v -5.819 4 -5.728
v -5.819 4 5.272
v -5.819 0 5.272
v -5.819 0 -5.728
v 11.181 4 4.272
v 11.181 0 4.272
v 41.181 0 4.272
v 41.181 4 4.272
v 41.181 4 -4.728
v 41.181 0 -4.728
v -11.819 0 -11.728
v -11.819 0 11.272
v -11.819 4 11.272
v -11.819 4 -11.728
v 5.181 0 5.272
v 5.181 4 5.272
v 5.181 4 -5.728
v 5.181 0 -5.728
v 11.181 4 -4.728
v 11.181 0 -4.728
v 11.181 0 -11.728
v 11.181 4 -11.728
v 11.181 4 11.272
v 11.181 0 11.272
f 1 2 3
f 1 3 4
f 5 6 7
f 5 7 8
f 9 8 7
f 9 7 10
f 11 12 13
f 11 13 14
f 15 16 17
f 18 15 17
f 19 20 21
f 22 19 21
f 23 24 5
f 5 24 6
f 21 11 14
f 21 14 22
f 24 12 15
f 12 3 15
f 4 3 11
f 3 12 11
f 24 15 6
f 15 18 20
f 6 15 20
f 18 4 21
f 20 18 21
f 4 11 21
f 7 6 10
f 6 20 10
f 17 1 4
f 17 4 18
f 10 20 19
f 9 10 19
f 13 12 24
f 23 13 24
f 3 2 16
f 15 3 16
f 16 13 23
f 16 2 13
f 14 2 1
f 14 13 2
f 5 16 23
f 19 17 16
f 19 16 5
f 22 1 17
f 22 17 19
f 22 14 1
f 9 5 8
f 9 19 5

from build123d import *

# Parameters (mm, degrees)
SKETCH1_W           = 23
SKETCH1_H           = 23
BOSS_EXTRUDE1_DEPTH = 4
SKETCH2_W           = 11
SKETCH2_H           = 11
CUT_EXTRUDE1_DEPTH  = 4
SKETCH3_W           = 9
SKETCH3_H           = 4
BOSS_EXTRUDE2_DEPTH = 30


with BuildPart() as part:
    # Sketch1 → Boss-Extrude1 (new body)
    with BuildSketch(Plane(origin=(0, 0, 0), x_dir=(1, 0, 0), z_dir=(0, 1, 0))):
        with Locations((-0.318811881, 0.227722772)):
            Rectangle(SKETCH1_W, SKETCH1_H)
    extrude(amount=BOSS_EXTRUDE1_DEPTH)

    # Sketch2 → Cut-Extrude1 (cut)
    with BuildSketch(Plane(origin=(0, 4, 0), x_dir=(1, 0, 0), z_dir=(0, 1, 0))):
        with Locations((-0.318811881, 0.227722772)):
            Rectangle(SKETCH2_W, SKETCH2_H)
    extrude(amount=-CUT_EXTRUDE1_DEPTH, mode=Mode.SUBTRACT)

    # Sketch3 → Boss-Extrude2 (add)
    with BuildSketch(Plane(origin=(11.181188119, 0, 0), x_dir=(0, 0, -1), z_dir=(1, 0, 0))):
        with Locations((0.227722772, 2)):
            Rectangle(SKETCH3_W, SKETCH3_H)
    extrude(amount=BOSS_EXTRUDE2_DEPTH)


solid = part.part
